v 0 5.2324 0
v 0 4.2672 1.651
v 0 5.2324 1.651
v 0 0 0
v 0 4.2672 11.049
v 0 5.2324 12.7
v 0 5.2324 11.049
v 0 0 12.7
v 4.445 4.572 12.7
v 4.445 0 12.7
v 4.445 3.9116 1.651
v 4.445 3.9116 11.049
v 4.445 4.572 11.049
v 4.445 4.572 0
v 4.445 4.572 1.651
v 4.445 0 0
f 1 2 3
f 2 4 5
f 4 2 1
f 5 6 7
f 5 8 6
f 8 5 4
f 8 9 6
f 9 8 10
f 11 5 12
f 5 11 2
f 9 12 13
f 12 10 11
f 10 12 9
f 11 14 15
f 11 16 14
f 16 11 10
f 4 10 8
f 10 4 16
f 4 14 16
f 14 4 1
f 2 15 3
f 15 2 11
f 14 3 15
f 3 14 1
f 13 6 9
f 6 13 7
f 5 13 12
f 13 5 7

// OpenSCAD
width=0.175*25.4;

linear_extrude(0.5*25.4) {
    polygon([[0,0], [width,0], [width, 0.154*25.4], [0, 0.168*25.4]]);
}

linear_extrude(0.065*25.4) {
    polygon([[0,0], [width,0], [width, 0.180*25.4], [0, 0.206*25.4]]);
}

translate([0, 0, (0.5 - 0.065)*25.4]) {
    linear_extrude(0.065*25.4) {
    polygon([[0,0], [width,0], [width, 0.180*25.4], [0, 0.206*25.4]]);
    }
}
